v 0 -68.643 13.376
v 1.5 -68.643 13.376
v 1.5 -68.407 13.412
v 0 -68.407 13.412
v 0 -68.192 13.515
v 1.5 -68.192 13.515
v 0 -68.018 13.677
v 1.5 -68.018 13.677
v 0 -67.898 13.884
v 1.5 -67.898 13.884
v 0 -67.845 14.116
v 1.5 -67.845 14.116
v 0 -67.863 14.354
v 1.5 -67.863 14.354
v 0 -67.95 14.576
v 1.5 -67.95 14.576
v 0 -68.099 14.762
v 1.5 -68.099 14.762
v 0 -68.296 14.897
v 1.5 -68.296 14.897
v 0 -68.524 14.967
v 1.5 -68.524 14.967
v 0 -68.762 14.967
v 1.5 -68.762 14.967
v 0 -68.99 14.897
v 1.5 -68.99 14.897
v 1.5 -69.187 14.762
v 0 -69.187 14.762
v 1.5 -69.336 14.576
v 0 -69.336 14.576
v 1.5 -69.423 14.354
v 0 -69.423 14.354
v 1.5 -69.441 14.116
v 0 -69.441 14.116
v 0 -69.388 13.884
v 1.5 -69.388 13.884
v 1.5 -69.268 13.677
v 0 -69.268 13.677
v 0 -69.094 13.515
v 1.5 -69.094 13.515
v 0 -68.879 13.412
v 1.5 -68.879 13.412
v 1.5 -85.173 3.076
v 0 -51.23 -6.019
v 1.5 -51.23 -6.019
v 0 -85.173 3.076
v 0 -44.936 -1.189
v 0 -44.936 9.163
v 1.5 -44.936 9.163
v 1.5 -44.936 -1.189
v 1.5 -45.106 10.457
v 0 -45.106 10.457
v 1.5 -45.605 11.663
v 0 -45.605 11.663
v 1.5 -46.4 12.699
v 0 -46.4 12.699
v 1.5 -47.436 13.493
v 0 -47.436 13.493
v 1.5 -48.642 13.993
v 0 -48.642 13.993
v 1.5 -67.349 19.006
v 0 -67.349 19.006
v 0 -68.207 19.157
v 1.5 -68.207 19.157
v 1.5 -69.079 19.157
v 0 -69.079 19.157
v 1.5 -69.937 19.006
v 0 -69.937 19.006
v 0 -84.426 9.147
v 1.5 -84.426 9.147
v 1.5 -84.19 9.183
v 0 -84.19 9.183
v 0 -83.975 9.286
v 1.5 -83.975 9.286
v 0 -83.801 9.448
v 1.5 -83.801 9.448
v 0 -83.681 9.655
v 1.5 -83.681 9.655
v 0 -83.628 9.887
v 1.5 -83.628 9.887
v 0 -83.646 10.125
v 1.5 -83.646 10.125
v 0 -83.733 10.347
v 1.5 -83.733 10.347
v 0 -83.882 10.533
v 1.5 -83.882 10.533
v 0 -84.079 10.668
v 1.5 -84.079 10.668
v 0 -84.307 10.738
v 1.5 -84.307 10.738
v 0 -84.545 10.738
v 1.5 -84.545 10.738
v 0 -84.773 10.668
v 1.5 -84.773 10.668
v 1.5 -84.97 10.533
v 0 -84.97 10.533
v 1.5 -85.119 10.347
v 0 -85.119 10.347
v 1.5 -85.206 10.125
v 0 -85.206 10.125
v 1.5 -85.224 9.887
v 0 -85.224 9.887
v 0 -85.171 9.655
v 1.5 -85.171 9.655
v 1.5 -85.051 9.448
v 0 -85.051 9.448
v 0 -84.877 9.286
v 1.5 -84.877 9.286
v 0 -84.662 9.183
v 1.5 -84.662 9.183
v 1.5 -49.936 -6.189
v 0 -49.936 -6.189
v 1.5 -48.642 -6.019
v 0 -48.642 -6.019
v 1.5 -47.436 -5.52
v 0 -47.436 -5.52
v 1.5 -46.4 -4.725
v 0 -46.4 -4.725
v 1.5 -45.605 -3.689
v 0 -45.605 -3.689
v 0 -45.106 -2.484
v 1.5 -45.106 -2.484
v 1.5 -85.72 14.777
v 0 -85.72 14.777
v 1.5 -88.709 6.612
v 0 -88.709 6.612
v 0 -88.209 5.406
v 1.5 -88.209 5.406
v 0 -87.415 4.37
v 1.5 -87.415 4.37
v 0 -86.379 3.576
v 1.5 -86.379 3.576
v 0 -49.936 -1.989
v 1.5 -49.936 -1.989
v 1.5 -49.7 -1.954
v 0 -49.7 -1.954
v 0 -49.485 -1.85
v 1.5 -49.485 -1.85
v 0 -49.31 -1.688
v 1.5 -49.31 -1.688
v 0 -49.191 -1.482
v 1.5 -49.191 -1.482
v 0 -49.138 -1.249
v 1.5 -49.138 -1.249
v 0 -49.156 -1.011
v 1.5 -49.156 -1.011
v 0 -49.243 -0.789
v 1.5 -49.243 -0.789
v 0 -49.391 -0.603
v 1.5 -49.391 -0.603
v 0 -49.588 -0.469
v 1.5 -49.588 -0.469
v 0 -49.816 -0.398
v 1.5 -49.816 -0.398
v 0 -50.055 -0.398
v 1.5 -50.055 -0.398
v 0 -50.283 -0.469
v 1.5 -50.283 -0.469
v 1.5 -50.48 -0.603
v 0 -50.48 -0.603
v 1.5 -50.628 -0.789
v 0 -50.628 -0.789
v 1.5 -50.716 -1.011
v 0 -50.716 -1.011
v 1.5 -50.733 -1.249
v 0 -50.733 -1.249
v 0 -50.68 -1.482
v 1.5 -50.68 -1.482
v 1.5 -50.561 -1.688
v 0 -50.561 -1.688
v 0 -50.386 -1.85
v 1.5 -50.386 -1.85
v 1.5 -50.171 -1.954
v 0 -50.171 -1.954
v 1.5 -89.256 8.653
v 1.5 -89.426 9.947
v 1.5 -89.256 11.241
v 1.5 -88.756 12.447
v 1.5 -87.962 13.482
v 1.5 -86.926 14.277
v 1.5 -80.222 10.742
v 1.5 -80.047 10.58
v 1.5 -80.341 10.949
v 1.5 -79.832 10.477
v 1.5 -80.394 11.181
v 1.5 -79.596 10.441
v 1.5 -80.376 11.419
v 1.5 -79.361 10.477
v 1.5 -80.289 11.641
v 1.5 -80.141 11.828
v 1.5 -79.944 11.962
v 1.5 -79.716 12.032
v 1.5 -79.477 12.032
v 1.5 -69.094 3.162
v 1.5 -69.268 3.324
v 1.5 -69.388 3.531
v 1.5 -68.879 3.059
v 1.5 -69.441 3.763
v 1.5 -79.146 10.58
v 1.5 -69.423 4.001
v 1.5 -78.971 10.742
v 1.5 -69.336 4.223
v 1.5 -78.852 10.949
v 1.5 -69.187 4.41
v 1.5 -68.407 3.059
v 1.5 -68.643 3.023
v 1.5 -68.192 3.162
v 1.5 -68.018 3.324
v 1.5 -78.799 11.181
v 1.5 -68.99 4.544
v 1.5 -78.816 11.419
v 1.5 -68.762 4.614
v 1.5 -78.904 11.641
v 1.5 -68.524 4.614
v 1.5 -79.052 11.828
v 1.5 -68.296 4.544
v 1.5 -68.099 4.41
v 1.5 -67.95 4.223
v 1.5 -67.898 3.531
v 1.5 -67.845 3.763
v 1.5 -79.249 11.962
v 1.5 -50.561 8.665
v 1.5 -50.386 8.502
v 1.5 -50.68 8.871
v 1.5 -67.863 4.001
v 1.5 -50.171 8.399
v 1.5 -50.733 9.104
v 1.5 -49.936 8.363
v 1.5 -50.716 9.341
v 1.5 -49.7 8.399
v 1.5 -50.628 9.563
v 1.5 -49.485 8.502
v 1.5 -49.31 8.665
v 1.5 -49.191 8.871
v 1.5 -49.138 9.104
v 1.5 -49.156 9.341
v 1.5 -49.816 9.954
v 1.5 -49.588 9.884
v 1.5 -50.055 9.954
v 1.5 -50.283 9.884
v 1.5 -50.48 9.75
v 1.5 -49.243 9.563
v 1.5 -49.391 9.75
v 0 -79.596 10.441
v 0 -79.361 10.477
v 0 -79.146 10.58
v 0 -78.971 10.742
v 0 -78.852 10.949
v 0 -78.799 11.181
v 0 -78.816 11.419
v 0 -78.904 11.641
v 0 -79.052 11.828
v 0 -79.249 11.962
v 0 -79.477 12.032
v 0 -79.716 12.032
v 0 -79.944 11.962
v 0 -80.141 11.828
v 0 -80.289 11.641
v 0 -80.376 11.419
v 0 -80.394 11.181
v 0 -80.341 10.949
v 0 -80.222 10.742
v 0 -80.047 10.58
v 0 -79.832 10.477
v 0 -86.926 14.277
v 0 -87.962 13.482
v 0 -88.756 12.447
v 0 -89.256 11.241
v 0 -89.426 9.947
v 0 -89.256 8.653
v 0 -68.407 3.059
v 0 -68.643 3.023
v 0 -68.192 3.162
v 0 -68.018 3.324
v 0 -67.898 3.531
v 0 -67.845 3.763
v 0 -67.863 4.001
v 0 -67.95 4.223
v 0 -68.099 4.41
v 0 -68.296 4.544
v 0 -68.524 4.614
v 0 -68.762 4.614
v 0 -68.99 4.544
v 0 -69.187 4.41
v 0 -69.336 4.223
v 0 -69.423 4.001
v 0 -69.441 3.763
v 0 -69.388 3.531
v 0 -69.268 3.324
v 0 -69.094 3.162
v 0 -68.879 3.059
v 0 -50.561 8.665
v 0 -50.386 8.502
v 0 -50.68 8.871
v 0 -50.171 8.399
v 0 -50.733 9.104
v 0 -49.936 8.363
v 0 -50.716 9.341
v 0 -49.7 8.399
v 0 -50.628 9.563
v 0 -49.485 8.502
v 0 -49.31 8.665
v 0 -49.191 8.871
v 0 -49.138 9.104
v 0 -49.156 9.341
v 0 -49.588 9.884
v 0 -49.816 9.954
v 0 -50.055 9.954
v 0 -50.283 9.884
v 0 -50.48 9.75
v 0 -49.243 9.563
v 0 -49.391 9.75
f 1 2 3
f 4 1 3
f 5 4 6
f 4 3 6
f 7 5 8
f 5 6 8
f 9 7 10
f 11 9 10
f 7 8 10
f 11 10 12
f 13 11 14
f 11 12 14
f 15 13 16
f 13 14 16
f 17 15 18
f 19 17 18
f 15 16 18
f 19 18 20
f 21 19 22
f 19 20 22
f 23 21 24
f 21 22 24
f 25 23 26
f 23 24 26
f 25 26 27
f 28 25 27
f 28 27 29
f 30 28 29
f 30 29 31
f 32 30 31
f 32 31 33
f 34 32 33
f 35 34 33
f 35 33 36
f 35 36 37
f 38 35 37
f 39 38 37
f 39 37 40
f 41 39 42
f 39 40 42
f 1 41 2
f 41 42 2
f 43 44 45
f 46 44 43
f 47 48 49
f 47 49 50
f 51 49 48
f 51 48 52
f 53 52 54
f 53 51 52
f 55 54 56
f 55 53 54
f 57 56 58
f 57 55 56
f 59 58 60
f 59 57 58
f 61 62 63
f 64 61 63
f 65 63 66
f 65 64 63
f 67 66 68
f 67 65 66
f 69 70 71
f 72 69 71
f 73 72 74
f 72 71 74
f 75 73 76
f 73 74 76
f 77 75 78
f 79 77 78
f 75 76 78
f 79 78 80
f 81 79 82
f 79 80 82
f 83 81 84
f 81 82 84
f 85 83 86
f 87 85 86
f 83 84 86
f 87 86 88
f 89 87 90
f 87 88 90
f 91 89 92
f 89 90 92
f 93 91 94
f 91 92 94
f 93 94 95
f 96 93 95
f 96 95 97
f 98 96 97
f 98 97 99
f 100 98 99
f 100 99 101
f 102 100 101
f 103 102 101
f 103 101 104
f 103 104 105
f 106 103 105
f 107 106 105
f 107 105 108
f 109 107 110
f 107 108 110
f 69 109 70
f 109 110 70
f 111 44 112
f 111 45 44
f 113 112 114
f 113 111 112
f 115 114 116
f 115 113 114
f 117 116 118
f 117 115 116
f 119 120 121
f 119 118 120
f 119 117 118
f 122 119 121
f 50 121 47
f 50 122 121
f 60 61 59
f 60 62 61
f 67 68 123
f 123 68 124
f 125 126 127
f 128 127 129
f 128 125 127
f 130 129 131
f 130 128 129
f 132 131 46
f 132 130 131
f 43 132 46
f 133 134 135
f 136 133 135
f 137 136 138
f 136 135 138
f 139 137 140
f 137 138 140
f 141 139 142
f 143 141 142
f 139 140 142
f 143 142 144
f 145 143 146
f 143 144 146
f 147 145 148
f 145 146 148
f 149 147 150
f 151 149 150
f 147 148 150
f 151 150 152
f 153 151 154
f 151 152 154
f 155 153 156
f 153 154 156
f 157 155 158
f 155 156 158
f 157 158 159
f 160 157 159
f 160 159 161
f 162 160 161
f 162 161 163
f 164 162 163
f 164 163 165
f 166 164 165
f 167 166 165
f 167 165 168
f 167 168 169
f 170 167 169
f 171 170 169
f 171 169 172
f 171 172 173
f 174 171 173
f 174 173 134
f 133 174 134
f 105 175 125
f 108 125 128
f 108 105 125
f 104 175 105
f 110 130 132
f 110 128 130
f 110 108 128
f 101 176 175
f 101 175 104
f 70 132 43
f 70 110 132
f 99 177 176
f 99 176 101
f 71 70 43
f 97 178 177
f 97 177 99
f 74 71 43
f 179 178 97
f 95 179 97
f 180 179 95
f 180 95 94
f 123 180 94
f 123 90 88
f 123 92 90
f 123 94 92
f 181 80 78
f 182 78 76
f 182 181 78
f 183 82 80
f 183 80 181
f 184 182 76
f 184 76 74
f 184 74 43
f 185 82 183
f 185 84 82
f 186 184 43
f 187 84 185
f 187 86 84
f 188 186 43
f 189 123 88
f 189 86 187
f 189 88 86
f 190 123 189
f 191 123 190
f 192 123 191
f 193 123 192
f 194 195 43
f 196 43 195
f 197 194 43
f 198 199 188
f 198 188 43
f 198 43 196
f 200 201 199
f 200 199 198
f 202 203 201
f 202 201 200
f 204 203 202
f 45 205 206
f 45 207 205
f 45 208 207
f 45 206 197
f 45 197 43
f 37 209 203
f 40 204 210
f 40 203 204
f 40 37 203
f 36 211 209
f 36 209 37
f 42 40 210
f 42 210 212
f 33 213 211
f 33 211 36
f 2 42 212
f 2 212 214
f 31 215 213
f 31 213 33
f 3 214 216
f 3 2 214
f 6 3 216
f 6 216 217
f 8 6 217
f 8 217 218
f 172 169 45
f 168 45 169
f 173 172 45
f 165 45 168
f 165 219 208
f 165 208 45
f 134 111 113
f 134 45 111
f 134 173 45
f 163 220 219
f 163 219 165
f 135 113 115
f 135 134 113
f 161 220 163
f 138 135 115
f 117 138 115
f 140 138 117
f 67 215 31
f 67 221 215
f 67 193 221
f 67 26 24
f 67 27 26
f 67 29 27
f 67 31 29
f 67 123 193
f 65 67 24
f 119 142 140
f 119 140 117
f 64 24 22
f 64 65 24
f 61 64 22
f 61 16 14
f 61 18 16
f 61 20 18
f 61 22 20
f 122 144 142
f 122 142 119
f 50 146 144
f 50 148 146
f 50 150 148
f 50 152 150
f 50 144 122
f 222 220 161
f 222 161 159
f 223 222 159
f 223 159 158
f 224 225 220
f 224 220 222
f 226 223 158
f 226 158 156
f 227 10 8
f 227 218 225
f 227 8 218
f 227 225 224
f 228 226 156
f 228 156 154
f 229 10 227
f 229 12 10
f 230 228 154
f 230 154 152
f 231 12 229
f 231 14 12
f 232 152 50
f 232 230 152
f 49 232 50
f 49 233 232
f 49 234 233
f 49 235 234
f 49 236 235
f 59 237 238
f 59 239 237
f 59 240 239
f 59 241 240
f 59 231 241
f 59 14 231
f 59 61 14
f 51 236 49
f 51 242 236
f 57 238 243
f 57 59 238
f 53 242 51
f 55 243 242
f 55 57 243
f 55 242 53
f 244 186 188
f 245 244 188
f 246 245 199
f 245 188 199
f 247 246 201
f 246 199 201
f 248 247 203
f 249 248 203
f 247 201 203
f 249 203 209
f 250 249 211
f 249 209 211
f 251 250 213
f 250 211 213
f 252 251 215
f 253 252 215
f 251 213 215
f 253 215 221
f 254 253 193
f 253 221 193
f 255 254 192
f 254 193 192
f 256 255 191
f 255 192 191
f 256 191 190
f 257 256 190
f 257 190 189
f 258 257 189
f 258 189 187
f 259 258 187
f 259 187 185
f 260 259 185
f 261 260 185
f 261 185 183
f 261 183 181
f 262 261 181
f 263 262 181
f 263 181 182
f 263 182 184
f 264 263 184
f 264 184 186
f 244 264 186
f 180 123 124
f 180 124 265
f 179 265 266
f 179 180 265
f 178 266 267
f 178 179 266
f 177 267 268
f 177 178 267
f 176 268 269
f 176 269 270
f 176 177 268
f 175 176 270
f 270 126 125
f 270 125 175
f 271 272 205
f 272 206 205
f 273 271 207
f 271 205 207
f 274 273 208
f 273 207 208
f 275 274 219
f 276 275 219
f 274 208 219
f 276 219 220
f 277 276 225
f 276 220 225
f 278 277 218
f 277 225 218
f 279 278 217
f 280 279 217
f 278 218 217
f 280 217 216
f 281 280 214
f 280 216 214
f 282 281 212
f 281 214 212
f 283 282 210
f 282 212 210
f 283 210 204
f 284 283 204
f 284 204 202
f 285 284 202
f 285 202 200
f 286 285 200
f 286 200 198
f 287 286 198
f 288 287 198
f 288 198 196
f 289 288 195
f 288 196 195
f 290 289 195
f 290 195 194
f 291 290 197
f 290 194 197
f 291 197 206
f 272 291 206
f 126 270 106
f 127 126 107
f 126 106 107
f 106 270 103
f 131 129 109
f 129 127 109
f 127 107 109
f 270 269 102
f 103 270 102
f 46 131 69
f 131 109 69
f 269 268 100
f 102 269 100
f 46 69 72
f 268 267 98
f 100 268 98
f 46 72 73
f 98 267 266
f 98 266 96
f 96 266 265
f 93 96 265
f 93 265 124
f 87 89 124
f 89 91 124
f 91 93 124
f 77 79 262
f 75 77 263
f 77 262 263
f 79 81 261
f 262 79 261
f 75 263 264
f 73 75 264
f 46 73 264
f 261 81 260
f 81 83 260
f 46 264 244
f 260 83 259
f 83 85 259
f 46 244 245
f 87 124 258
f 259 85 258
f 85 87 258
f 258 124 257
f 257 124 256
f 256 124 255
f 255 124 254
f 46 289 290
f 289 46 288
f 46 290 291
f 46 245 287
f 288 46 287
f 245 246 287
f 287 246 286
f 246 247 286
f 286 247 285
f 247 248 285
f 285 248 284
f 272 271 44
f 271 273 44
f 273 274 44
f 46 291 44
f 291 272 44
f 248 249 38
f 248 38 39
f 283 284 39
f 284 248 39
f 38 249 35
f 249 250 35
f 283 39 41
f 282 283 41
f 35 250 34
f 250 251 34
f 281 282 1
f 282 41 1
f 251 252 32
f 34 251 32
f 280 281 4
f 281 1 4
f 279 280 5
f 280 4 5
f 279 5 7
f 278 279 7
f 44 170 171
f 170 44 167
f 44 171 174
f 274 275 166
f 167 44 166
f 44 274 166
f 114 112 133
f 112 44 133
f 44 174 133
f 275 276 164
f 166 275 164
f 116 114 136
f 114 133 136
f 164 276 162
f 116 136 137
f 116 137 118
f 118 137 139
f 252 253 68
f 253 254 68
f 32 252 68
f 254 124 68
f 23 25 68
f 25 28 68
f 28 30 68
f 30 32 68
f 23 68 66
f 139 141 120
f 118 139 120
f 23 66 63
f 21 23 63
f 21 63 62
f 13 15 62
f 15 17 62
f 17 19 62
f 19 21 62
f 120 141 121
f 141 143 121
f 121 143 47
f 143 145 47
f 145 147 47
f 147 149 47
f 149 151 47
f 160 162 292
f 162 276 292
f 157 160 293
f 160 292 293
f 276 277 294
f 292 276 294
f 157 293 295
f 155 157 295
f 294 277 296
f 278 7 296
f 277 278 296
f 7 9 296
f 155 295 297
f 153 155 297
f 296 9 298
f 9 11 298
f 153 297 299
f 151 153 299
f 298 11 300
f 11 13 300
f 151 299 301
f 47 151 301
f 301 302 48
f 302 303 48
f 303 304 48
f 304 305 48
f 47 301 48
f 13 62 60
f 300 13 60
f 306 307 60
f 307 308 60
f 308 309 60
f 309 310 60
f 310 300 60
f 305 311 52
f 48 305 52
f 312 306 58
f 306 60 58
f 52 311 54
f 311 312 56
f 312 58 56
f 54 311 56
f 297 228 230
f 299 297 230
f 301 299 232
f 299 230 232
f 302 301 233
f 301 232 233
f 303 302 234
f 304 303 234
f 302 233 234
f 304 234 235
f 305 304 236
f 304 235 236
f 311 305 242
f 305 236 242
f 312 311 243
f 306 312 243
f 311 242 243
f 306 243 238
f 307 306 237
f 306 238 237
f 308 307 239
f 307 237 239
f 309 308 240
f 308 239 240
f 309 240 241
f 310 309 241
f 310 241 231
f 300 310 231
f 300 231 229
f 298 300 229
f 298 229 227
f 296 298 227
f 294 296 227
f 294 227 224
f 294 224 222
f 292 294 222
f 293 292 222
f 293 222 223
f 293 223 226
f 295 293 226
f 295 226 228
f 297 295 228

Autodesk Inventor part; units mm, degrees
ref_plane "YZ Plane" through (0, 0, 0) normal (1, 0, 0) x (0, 1, 0)
ref_plane "XZ Plane" through (0, 0, 0) normal (0, 1, 0) x (-1, 0, 0)
ref_plane "XY Plane" through (0, 0, 0) normal (0, 0, 1) x (1, 0, 0)
sketch "スケッチ1" plane through (0, 0, 0) normal (1, 0, 0) x (0, 1, 0)
  circle A0 centre (0, 0) radius 13
  circle A1 centre (0, 0) radius 4.25
  circle A2 centre (0, 0) radius 6 construction
  circle A3 centre (6, 0) radius 1
  circle A4 centre (3, 5.1962) radius 1
  circle A5 centre (-3, 5.1962) radius 1
  circle A6 centre (-6, 0) radius 1
  circle A7 centre (-3, -5.1962) radius 1
  circle A8 centre (3, -5.1962) radius 1
  line L0 (0, 13) -> (-44.9356, 13)
  line L1 (-44.9356, 13) -> (-44.9356, -13)
  line L2 (-44.9356, -13) -> (0, -13)
  line L3 (0, -13) -> (0, 13)
  line L4 (-20, 6.3185) -> (-25.1764, -13)
  line L5 (-25.1764, -13) -> (-92.7912, 5.1173)
  line L6 (-92.7912, 5.1173) -> (-87.6148, 24.4358)
  line L7 (-87.6148, 24.4358) -> (-20, 6.3185)
  line L8 (-68.643, 19.3524) -> (-90.5498, 13.4825)
  line L9 (-87.9616, 3.8232) -> (-90.5498, 13.4825)
  circle A9 centre (-72.0415, 13.3611) radius 2.5
  circle A10 centre (-60.509, 10.271) radius 2.5
  circle A11 centre (-79.5332, 8.4667) radius 2.5
  circle A12 centre (-68.0007, 5.3766) radius 2.5
  circle A13 centre (-56.4682, 2.2864) radius 2.5
  line L10 (-72.0415, 13.3611) -> (-60.509, 10.271) construction
  line L11 (-79.5332, 8.4667) -> (-56.4682, 2.2864) construction
  line L12 (-72.0415, 13.3611) -> (-72.6885, 10.9463) construction
  line L13 (-79.5332, 8.4667) -> (-80.1803, 6.0519) construction
  line L14 (-68.0007, 5.3766) -> (-68.6477, 2.9618) construction
  line L15 (-79.5332, 8.4667) -> (-89.9539, 11.2589) construction
  line L16 (-56.4682, 2.2864) -> (-44.9356, -0.8037) construction
  line L17 (-56.4682, 2.2864) -> (-57.1152, -0.1284)
  point P0 (-3.3656, 12.5568)
  point P1 (-44.9356, -7.7055)
  dimension "d2" = 26
  dimension "d4" = 12
  dimension "d27" = 5
  dimension "d29" = 5
  dimension "d30" = 5
  dimension "d31" = 5
  dimension "d3" = 8.5
  dimension "d5" = 2
  dimension "d8" = 360
  dimension "d12" = 15
  dimension "d13" = 20
  dimension "d14" = 70
  dimension "d15" = 20
  dimension "d18" = 10
  dimension "d19" = 30
  dimension "d28" = 5
  dimension "d32" = 11.9393
  dimension "d33" = 11.9393
  dimension "d34" = 11.9393
  dimension "d35" = 5.9697
  dimension "d36" = 6.6667
  dimension "d37" = 6.6667
  dimension "d38" = 6.6667
  dimension "d39" = 11.9393
  dimension "d40" = 11.9393
extrude "押し出し1" add sketch "スケッチ1" along normal blind 1.5 contours L1 L5 L9 L8 L7 | A9 | A10 | A11 | A12 | A13
fillet "フィレット1" radius 5 5 edges at (0.75, -68.643, 19.3524) (0.75, -90.5498, 13.4825) (0.75, -87.9616, 3.8232) (0.75, -44.9356, -7.7055) (0.75, -44.9356, 13)
sketch "スケッチ3" plane through (1.5, 0, 0) normal (1, 0, 0) x (0, 0, -1)
  point P0 (0, 0)
sketch "スケッチ4" plane through (1.5, 0, 0) normal (1, 0, 0) x (0, 0, -1)
  circle A0 centre (-9.947, -84.426) radius 0.8 projected
  circle A1 centre (-11.2411, -79.5964) radius 0.8 projected
  circle A2 centre (-14.176, -68.643) radius 0.8
  circle A3 centre (-9.1634, -49.9356) radius 0.8
  circle A4 centre (1.1894, -49.9356) radius 0.8
  circle A5 centre (-3.8232, -68.643) radius 0.8
  arc A6 (-19.0056, -67.3489) -> (-19.0056, -69.9371) centre (-14.176, -68.643) ccw projected
  arc A7 (-9.1634, -44.9356) -> (-13.993, -48.6415) centre (-9.1634, -49.9356) ccw projected
  arc A8 (6.019, -51.2297) -> (1.1894, -44.9356) centre (1.1894, -49.9356) ccw projected
  line L0 (-3.8232, -68.643) -> (1.1894, -49.9356) construction
  line L1 (-3.0761, -85.1732) -> (6.019, -51.2297) projected
  point P0 (0, 0)
  dimension "d43" = 1.6
  dimension "d44" = 1.6
  dimension "d45" = 1.6
  dimension "d46" = 1.6
extrude "押し出し2" cut sketch "スケッチ4" against normal through all
equation "\"d32\" = d40"
equation "\"d33\" = d32"
equation "\"d34\" = d33"
equation "\"d35\" = 0.5 * d33"
equation "\"d36\" = d38"
equation "\"d37\" = d38"
equation "\"d39\" = d40"
properties part number "hand" material "アルミニウム 6061"
